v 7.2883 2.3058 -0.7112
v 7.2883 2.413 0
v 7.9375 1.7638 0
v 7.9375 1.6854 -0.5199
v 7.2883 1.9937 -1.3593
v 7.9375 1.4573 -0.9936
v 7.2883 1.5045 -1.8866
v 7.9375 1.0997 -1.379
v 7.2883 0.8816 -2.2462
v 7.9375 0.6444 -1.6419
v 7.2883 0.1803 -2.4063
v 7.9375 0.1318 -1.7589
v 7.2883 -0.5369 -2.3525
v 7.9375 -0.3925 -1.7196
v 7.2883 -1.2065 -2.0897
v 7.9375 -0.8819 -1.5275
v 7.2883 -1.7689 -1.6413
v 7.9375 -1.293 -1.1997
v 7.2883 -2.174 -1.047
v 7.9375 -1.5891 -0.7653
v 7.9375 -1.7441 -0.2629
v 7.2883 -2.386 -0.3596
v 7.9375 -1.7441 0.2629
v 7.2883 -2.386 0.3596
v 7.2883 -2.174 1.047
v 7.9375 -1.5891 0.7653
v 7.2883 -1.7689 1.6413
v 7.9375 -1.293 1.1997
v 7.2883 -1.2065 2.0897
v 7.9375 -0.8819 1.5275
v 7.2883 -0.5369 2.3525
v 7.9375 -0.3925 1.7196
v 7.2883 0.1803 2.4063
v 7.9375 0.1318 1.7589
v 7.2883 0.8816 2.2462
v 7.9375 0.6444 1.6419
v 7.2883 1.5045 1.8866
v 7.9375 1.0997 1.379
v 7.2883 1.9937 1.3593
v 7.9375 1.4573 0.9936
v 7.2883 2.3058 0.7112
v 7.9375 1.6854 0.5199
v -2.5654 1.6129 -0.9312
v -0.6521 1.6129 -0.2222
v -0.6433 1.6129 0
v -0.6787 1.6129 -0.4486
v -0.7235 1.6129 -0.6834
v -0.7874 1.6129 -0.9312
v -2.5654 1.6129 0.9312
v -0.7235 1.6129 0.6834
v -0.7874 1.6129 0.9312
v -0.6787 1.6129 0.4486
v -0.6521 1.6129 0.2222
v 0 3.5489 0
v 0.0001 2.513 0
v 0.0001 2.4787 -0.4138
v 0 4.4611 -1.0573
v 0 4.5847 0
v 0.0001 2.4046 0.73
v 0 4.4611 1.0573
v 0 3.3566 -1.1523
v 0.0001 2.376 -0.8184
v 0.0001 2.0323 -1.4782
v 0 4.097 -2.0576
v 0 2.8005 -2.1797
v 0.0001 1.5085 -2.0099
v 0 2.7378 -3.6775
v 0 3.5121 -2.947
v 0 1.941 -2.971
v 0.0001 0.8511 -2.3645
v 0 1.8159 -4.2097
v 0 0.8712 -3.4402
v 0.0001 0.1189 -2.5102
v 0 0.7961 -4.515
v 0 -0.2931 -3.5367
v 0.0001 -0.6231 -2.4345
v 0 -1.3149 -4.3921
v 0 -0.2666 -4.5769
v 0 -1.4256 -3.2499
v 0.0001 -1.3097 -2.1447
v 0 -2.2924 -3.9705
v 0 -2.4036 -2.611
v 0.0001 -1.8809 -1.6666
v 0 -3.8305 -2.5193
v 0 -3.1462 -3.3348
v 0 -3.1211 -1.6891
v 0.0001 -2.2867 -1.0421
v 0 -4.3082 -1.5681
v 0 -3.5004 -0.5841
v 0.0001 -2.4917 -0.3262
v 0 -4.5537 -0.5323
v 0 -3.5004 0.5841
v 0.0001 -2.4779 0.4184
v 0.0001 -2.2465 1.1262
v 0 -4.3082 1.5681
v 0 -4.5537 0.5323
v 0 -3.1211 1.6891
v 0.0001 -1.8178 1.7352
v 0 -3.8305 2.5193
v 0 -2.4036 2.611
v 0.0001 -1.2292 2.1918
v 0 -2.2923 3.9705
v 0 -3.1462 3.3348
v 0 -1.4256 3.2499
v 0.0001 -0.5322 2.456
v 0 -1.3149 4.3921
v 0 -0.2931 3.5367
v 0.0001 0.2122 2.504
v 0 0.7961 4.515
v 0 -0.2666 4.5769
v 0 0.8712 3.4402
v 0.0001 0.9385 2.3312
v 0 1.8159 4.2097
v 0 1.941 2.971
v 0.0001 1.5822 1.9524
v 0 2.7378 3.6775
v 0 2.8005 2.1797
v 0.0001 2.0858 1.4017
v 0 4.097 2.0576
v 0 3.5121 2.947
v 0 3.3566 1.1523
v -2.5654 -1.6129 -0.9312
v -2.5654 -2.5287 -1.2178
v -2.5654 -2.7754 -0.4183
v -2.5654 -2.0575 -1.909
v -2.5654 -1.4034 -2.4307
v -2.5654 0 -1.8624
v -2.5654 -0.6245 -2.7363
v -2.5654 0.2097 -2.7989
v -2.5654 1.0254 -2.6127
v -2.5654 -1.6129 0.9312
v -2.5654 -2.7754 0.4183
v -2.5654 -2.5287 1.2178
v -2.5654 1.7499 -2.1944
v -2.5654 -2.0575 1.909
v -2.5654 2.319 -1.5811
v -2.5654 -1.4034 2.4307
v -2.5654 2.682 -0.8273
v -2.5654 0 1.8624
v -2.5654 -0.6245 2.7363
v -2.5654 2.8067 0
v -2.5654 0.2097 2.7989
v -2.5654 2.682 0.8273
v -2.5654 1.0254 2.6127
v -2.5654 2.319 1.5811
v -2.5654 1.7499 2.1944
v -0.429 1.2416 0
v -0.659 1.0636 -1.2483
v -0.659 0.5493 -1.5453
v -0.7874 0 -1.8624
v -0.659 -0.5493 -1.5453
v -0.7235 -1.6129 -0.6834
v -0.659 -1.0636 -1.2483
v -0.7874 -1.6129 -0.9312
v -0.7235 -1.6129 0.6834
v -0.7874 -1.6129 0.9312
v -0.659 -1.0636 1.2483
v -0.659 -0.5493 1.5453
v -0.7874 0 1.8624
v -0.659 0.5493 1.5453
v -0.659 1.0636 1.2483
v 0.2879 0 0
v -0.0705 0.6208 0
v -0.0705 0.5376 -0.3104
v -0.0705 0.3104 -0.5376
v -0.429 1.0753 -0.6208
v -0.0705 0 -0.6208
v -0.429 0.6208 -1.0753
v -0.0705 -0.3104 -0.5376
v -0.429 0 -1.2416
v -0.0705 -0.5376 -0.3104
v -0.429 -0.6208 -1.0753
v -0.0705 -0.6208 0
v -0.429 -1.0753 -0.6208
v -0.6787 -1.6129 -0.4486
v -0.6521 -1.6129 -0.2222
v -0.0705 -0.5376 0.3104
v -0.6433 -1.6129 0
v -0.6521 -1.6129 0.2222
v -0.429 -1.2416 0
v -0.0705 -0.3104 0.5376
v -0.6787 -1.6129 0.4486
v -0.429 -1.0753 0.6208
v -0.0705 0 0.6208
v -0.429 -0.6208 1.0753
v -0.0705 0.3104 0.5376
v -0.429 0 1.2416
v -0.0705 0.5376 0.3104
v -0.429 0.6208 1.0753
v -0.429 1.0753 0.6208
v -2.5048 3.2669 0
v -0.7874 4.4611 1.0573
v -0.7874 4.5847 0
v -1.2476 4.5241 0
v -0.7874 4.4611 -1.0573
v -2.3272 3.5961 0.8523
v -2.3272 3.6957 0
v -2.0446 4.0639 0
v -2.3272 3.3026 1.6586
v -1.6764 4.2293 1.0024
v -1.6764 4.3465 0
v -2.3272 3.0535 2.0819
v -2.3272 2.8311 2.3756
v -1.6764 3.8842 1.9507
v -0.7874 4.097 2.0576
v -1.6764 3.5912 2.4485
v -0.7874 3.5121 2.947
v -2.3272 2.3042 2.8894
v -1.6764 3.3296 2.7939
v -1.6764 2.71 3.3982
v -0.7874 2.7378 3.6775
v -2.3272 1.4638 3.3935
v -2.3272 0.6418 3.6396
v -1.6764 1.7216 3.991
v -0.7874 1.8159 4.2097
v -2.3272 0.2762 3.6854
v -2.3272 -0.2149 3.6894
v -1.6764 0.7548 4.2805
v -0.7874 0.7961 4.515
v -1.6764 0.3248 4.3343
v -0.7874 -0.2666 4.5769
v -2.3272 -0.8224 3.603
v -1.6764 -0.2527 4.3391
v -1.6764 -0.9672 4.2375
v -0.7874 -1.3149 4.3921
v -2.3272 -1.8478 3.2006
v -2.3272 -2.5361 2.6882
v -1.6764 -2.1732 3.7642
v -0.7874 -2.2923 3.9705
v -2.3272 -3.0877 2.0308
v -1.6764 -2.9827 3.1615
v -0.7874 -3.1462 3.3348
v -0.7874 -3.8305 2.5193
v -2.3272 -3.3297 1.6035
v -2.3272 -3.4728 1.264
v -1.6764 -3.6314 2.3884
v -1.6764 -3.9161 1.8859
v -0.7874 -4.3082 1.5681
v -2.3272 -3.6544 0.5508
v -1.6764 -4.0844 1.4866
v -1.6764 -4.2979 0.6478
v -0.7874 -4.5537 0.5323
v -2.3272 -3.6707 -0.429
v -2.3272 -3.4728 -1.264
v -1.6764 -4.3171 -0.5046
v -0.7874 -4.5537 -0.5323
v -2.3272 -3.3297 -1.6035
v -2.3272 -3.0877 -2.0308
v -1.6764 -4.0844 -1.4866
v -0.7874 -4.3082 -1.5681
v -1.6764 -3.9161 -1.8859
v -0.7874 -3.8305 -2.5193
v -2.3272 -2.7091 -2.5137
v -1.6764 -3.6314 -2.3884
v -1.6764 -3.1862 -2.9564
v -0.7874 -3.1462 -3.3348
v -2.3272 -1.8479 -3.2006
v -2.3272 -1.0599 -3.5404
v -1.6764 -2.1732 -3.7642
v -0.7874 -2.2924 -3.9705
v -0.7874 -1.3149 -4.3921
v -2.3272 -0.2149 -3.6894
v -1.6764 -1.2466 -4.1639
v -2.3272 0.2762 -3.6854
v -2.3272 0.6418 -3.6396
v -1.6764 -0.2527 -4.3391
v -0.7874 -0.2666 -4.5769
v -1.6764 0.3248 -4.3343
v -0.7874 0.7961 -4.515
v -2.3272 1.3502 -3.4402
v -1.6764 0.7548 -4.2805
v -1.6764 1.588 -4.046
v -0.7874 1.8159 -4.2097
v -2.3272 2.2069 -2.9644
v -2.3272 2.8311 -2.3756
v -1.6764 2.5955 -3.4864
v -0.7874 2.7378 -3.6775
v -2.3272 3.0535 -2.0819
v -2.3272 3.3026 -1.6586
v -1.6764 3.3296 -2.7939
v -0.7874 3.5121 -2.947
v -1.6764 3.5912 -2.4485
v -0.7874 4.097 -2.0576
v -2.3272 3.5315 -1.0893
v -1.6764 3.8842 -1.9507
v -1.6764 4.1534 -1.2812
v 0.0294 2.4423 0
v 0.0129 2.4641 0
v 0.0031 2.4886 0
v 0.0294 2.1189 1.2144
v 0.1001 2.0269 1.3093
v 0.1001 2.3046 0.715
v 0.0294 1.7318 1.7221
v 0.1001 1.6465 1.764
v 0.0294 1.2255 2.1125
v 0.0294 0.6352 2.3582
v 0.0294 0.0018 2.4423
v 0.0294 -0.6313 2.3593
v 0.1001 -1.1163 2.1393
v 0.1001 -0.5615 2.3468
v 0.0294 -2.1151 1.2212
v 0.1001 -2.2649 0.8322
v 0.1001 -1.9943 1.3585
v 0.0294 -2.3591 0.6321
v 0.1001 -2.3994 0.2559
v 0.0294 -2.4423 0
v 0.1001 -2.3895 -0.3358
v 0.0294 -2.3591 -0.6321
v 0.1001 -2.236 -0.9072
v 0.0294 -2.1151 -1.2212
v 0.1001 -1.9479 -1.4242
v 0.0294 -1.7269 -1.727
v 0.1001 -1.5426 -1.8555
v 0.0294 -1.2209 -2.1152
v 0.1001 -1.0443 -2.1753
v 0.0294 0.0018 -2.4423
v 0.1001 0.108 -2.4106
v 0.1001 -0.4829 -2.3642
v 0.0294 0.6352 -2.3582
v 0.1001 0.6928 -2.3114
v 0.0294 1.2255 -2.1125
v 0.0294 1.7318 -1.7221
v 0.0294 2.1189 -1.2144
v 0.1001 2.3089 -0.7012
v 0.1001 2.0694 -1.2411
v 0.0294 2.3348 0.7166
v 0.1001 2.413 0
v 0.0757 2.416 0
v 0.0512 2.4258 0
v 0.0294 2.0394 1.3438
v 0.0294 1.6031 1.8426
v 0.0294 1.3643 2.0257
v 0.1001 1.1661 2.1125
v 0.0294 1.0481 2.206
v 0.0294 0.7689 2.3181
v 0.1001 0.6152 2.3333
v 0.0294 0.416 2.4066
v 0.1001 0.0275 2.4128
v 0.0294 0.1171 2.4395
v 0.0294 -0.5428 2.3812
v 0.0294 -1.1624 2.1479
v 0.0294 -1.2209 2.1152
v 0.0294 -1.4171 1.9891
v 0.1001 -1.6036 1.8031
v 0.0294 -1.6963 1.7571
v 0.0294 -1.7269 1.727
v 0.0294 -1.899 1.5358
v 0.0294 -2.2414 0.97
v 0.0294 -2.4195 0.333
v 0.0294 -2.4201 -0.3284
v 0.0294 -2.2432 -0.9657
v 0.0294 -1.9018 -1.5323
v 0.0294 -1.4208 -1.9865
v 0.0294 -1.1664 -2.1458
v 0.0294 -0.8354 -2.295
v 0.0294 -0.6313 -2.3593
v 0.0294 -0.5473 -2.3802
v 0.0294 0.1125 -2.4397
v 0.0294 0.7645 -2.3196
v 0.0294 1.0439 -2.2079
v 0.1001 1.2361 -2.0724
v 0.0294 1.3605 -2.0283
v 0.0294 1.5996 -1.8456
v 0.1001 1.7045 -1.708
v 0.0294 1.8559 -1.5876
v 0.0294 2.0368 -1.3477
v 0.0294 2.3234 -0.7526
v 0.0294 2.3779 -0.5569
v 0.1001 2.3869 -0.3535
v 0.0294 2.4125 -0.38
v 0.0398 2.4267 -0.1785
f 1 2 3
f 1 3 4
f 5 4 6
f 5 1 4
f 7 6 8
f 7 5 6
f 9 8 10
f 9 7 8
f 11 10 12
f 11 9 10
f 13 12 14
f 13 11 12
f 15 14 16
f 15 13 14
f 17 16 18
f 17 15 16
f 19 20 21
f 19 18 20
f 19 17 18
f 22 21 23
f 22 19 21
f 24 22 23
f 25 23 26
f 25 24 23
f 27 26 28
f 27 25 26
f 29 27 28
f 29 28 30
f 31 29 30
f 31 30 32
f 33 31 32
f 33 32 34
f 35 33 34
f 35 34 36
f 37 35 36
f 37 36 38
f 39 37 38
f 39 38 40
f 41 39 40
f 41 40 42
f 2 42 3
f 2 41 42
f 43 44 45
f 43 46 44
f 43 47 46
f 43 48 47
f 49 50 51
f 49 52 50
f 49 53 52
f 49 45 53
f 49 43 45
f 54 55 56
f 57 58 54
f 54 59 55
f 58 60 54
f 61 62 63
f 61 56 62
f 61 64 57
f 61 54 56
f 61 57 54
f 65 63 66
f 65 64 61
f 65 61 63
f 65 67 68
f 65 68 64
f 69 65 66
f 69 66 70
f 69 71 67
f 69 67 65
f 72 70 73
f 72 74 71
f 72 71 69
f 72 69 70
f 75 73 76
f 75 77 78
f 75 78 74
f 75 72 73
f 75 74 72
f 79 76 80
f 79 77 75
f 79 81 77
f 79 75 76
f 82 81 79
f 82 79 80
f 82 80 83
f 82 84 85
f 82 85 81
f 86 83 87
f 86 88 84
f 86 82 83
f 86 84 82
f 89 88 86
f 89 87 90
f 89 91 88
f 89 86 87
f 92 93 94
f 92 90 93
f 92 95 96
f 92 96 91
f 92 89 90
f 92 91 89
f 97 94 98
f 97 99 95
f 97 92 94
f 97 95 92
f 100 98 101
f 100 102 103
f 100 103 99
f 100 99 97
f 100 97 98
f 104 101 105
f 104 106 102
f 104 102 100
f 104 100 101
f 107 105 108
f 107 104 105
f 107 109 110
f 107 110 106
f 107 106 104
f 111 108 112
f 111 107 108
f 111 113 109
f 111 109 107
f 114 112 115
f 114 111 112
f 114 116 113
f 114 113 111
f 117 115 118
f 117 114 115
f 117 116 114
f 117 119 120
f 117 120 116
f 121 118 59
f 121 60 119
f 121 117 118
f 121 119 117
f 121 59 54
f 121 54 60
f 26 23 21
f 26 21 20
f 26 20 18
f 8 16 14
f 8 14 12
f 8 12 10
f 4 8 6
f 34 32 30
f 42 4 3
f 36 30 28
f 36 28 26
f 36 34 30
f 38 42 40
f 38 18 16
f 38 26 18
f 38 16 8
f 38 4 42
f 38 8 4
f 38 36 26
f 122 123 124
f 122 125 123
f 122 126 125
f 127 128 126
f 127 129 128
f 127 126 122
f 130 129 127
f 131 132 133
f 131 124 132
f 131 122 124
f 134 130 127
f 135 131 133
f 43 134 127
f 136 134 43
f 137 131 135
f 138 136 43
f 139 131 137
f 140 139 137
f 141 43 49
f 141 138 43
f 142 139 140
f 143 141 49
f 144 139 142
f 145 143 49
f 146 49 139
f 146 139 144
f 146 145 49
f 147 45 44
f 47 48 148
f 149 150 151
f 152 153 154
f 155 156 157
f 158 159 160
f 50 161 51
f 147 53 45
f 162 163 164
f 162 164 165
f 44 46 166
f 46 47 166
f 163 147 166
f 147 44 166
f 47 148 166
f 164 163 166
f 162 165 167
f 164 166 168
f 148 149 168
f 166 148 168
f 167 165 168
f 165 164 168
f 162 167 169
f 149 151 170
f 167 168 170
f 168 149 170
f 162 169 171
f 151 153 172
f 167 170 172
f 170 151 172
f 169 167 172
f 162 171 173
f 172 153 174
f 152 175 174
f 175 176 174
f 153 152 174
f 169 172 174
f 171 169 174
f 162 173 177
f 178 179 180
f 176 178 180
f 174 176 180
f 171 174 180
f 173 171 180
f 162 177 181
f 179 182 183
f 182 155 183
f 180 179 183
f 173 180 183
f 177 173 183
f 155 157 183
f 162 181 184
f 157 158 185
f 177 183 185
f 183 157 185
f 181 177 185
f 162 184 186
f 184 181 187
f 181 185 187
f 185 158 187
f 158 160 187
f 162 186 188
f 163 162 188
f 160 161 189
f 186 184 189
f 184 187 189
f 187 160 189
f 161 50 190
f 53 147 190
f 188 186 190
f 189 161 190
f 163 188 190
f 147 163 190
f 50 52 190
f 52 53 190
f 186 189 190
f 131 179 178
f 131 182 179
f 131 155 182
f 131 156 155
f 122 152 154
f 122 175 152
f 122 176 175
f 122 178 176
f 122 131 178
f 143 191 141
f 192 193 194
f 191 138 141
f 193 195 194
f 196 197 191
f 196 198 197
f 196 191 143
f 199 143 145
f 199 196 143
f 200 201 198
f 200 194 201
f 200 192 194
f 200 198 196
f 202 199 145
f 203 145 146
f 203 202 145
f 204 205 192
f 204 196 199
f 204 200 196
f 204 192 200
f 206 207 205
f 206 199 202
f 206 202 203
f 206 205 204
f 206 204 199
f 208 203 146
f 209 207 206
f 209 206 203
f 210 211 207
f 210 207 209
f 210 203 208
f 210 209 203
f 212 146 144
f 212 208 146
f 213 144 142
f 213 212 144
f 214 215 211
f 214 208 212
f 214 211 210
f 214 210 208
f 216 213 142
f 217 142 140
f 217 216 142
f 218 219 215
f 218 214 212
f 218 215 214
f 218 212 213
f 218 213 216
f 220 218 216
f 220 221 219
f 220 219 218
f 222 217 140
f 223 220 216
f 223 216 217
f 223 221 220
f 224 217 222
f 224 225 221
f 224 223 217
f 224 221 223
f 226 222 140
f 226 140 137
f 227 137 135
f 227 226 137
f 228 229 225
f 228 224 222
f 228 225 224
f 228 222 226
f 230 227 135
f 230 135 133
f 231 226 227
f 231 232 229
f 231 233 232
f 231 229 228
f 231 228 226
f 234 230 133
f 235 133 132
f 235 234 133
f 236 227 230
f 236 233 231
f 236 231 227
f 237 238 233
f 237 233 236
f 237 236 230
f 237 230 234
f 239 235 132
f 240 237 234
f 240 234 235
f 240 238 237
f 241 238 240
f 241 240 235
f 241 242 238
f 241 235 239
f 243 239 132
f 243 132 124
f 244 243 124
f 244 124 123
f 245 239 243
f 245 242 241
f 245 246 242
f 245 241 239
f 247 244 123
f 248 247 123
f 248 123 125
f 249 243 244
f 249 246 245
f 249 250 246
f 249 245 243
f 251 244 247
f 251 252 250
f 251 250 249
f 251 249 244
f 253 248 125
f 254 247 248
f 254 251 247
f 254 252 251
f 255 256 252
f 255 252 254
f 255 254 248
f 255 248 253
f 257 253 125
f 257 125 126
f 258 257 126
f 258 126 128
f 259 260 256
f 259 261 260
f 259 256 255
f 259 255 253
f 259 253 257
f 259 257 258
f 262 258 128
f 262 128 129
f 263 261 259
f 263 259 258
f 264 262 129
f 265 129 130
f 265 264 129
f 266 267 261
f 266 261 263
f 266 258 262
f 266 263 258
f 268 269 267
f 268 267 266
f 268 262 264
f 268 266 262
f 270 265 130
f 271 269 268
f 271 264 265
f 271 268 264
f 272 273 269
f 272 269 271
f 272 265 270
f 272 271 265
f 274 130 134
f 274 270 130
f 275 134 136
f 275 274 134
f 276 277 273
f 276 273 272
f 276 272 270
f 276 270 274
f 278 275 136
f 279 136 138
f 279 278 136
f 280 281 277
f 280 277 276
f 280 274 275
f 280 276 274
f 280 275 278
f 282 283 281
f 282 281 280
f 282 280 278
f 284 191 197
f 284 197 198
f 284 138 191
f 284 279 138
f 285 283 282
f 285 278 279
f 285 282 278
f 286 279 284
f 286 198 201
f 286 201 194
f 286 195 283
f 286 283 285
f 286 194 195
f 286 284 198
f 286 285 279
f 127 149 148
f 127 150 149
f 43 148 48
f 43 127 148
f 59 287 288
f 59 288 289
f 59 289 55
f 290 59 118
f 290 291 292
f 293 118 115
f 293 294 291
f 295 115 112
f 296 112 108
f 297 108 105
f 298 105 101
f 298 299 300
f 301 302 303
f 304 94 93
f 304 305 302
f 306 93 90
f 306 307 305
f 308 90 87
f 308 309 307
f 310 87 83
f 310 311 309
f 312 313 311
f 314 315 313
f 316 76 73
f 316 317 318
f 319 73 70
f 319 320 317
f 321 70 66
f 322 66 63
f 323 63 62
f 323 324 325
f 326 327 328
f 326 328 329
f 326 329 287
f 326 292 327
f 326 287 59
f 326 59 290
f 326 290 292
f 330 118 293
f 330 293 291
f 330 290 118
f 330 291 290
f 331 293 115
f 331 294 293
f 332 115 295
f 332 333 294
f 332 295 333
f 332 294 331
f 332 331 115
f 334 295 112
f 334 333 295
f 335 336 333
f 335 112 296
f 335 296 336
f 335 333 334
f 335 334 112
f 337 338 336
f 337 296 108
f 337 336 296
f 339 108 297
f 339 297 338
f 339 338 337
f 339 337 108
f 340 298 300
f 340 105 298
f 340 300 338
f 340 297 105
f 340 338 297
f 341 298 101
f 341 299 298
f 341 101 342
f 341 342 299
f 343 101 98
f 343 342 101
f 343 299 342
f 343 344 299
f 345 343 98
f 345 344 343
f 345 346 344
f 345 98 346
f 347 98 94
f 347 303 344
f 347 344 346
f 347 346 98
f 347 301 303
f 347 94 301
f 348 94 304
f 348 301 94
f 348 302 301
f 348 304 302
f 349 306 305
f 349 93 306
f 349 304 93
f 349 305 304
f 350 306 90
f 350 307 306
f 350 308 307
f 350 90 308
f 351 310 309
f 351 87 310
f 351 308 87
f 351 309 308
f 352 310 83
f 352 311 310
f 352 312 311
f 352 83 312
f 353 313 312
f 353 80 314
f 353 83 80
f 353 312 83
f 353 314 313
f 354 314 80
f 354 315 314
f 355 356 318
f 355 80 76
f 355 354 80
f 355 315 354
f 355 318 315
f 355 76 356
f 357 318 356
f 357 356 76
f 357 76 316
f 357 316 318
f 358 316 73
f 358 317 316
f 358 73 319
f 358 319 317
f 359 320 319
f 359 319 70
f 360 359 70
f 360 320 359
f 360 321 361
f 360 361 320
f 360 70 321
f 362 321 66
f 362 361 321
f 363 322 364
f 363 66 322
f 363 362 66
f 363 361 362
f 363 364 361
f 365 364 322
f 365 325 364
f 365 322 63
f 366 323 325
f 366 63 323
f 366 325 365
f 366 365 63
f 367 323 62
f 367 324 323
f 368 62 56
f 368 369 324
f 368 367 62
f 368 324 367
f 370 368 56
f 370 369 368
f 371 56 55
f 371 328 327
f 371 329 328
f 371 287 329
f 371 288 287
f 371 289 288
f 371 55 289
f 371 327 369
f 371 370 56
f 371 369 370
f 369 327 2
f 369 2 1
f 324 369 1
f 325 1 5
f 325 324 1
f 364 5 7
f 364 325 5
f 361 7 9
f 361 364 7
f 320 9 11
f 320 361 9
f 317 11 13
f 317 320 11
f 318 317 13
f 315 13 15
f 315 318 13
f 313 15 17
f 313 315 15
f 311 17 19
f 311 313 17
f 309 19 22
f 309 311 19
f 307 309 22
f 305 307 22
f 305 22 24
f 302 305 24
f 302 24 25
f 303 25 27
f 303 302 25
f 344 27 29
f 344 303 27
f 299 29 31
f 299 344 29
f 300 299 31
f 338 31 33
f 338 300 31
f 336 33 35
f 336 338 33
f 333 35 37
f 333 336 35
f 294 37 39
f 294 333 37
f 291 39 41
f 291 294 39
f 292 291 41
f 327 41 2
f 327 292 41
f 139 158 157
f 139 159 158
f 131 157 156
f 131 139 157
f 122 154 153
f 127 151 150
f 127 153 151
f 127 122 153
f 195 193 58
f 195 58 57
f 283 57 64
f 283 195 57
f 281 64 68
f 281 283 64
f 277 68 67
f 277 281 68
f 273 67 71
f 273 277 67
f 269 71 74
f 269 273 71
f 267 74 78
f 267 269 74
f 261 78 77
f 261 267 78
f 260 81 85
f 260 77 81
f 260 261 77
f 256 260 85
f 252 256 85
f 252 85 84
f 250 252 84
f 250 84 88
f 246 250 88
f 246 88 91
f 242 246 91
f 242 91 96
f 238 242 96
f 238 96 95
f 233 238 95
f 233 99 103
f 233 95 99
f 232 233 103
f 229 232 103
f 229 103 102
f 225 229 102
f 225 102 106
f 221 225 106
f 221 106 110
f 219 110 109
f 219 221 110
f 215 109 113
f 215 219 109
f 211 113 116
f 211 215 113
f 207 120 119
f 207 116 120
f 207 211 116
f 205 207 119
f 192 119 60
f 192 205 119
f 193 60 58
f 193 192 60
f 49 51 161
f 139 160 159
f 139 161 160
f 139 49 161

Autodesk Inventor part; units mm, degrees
ref_plane "YZ Plane" through (0, 0, 0) normal (1, 0, 0) x (0, 1, 0)
ref_plane "XZ Plane" through (0, 0, 0) normal (0, 1, 0) x (-1, 0, 0)
sketch "Sketch1" plane through (0, 0, 0) normal (0, 0, 1) x (1, 0, 0)
  line L0 (0.2879, 0) -> (7.9375, 0)
  line L1 (7.9375, 0) -> (7.9375, 2.413)
  line L2 (7.9375, 2.413) -> (2.0957, 2.413)
  line L3 (2.0957, 2.413) -> (0.0001, 2.413)
  line L4 (0.0001, 2.413) -> (0, 2.413)
  line L5 (0, 2.413) -> (0, 4.5847)
  line L6 (0, 4.5847) -> (-2.5654, 4.5847)
  line L7 (-2.5654, 4.5847) -> (-2.5654, 1.8624)
  line L8 (-2.5654, 1.8624) -> (-0.7874, 1.8624)
  line L9 (-0.7874, 1.8624) -> (0.2879, 0)
  line L10 (-4.666, 0) -> (10.0381, 0) projected
  line L11 (0, -0.9169) -> (0, 5.5016) projected
  line L12 (2.0957, 2.413) -> (0, 2.413) construction
  dimension "d1" = 5.8418
  dimension "d2" = 2.0956
  dimension "d3" = 2.5654
  dimension "d4" = 1.778
  dimension "d5" = 60
  dimension "d6" = 4.826
  dimension "d7" = 4.826
  dimension "d8" = 3.7248
  dimension "d9" = 9.1694
  dimension "d26" = 7.9375
revolve "Body" add sketch "Sketch1" angle 360 about axis through (0.2879, 0, 0) along (1, 0, 0) contours L9 L11 L3 L2 L1 L0 | L9 L8 L7 L6 L5 L11
sketch "Sketch2" plane through (-2.5654, 0, 0) normal (-1, 0, 0) x (0, 0, 1)
  circle A0 centre (0, 0) radius 1.8624 projected
  line L0 (0, -6.4186) -> (0, 6.4186) projected
  line L1 (-6.4186, 0) -> (6.4186, 0) projected
  line L2 (1.8624, 0) -> (0.9312, -1.6129)
  line L3 (0.9312, -1.6129) -> (-0.9312, -1.6129)
  line L4 (-0.9312, -1.6129) -> (-1.8624, 0)
  line L5 (-1.8624, 0) -> (-0.9312, 1.6129)
  line L6 (-0.9312, 1.6129) -> (0.9312, 1.6129)
  line L7 (0.9312, 1.6129) -> (1.8624, 0)
  point P0 (0, 0)
extrude "Slot" add sketch "Sketch2" against normal up to next contours L7 A0 | A0 L2 | L6 L0 A0 | A0 L0 L3 | L0 L6 A0 | A0 L3 L0 | L4 A0 | A0 L5
fillet "Fillet1" radius 1.778 1 edges at (-2.5654, -4.5847, 0)
thread "Thread" size "10-24 UNC" class "2A" standard "ANSI Unified Screw Threads" length 5.8418
chamfer "Chamfer1" distance 0.6492 distance2 0.6492 1 edges at (7.9375, -2.413, 0) measured on face at (7.9375, -0.2686, 0.7084)
ref_plane "Work Plane1" through (29, 0, 0) normal (0, -1, 0) x (1, 0, 0)
fillet "Fillet2" radius 0.1 1 edges at (0.0001, -2.413, 0)
equation "\"d30\" = R"
equation "\"d17\" = RR"
equation "\"d13\" = GEL"
equation "\"d15\" = -0.5 * SPD + 0.5 * GD"
equation "\"d16\" = GUL"
equation "\"d1\" = GEL"
equation "\"d3\" = KOH"
equation "\"d4\" = INTI"
equation "\"d6\" = GD"
equation "\"d7\" = BDM"
equation "\"d8\" = 1.1547 * SW"
equation "\"d9\" = KOD"
equation "\"d26\" = NLG"
equation "\"GD\" = NND"
equation "\"NLG\" = 7.9375"
equation "\"GEL\" = 5.8418"
equation "\"KOD\" = 9.1694"
equation "\"KOH\" = 2.5654"
equation "\"INTI\" = 1.778"
equation "\"GAL\" = 2.0955"
equation "\"GUL\" = 0.64922"
equation "\"BDM\" = NND"
equation "\"SW\" = 3.2258"
equation "\"RR\" = 1.778"
equation "\"SPD\" = GD1"
equation "\"R\" = 0.1"
equation "\"KR\" = 5.4102"
equation "\"GD1\" = 3.52755"
equation "\"THREADDIA\" = 4.826"
equation "\"FAWI\" = 45deg"
equation "\"KOH1\" = 1.778"
equation "\"NND\" = 4.826"
equation "\"TOA\" = 30deg"
equation "\"E0\" = 1.155 * SW"
properties part number "Unbrako - 10 x 5/16" material "Steel, Mild"
